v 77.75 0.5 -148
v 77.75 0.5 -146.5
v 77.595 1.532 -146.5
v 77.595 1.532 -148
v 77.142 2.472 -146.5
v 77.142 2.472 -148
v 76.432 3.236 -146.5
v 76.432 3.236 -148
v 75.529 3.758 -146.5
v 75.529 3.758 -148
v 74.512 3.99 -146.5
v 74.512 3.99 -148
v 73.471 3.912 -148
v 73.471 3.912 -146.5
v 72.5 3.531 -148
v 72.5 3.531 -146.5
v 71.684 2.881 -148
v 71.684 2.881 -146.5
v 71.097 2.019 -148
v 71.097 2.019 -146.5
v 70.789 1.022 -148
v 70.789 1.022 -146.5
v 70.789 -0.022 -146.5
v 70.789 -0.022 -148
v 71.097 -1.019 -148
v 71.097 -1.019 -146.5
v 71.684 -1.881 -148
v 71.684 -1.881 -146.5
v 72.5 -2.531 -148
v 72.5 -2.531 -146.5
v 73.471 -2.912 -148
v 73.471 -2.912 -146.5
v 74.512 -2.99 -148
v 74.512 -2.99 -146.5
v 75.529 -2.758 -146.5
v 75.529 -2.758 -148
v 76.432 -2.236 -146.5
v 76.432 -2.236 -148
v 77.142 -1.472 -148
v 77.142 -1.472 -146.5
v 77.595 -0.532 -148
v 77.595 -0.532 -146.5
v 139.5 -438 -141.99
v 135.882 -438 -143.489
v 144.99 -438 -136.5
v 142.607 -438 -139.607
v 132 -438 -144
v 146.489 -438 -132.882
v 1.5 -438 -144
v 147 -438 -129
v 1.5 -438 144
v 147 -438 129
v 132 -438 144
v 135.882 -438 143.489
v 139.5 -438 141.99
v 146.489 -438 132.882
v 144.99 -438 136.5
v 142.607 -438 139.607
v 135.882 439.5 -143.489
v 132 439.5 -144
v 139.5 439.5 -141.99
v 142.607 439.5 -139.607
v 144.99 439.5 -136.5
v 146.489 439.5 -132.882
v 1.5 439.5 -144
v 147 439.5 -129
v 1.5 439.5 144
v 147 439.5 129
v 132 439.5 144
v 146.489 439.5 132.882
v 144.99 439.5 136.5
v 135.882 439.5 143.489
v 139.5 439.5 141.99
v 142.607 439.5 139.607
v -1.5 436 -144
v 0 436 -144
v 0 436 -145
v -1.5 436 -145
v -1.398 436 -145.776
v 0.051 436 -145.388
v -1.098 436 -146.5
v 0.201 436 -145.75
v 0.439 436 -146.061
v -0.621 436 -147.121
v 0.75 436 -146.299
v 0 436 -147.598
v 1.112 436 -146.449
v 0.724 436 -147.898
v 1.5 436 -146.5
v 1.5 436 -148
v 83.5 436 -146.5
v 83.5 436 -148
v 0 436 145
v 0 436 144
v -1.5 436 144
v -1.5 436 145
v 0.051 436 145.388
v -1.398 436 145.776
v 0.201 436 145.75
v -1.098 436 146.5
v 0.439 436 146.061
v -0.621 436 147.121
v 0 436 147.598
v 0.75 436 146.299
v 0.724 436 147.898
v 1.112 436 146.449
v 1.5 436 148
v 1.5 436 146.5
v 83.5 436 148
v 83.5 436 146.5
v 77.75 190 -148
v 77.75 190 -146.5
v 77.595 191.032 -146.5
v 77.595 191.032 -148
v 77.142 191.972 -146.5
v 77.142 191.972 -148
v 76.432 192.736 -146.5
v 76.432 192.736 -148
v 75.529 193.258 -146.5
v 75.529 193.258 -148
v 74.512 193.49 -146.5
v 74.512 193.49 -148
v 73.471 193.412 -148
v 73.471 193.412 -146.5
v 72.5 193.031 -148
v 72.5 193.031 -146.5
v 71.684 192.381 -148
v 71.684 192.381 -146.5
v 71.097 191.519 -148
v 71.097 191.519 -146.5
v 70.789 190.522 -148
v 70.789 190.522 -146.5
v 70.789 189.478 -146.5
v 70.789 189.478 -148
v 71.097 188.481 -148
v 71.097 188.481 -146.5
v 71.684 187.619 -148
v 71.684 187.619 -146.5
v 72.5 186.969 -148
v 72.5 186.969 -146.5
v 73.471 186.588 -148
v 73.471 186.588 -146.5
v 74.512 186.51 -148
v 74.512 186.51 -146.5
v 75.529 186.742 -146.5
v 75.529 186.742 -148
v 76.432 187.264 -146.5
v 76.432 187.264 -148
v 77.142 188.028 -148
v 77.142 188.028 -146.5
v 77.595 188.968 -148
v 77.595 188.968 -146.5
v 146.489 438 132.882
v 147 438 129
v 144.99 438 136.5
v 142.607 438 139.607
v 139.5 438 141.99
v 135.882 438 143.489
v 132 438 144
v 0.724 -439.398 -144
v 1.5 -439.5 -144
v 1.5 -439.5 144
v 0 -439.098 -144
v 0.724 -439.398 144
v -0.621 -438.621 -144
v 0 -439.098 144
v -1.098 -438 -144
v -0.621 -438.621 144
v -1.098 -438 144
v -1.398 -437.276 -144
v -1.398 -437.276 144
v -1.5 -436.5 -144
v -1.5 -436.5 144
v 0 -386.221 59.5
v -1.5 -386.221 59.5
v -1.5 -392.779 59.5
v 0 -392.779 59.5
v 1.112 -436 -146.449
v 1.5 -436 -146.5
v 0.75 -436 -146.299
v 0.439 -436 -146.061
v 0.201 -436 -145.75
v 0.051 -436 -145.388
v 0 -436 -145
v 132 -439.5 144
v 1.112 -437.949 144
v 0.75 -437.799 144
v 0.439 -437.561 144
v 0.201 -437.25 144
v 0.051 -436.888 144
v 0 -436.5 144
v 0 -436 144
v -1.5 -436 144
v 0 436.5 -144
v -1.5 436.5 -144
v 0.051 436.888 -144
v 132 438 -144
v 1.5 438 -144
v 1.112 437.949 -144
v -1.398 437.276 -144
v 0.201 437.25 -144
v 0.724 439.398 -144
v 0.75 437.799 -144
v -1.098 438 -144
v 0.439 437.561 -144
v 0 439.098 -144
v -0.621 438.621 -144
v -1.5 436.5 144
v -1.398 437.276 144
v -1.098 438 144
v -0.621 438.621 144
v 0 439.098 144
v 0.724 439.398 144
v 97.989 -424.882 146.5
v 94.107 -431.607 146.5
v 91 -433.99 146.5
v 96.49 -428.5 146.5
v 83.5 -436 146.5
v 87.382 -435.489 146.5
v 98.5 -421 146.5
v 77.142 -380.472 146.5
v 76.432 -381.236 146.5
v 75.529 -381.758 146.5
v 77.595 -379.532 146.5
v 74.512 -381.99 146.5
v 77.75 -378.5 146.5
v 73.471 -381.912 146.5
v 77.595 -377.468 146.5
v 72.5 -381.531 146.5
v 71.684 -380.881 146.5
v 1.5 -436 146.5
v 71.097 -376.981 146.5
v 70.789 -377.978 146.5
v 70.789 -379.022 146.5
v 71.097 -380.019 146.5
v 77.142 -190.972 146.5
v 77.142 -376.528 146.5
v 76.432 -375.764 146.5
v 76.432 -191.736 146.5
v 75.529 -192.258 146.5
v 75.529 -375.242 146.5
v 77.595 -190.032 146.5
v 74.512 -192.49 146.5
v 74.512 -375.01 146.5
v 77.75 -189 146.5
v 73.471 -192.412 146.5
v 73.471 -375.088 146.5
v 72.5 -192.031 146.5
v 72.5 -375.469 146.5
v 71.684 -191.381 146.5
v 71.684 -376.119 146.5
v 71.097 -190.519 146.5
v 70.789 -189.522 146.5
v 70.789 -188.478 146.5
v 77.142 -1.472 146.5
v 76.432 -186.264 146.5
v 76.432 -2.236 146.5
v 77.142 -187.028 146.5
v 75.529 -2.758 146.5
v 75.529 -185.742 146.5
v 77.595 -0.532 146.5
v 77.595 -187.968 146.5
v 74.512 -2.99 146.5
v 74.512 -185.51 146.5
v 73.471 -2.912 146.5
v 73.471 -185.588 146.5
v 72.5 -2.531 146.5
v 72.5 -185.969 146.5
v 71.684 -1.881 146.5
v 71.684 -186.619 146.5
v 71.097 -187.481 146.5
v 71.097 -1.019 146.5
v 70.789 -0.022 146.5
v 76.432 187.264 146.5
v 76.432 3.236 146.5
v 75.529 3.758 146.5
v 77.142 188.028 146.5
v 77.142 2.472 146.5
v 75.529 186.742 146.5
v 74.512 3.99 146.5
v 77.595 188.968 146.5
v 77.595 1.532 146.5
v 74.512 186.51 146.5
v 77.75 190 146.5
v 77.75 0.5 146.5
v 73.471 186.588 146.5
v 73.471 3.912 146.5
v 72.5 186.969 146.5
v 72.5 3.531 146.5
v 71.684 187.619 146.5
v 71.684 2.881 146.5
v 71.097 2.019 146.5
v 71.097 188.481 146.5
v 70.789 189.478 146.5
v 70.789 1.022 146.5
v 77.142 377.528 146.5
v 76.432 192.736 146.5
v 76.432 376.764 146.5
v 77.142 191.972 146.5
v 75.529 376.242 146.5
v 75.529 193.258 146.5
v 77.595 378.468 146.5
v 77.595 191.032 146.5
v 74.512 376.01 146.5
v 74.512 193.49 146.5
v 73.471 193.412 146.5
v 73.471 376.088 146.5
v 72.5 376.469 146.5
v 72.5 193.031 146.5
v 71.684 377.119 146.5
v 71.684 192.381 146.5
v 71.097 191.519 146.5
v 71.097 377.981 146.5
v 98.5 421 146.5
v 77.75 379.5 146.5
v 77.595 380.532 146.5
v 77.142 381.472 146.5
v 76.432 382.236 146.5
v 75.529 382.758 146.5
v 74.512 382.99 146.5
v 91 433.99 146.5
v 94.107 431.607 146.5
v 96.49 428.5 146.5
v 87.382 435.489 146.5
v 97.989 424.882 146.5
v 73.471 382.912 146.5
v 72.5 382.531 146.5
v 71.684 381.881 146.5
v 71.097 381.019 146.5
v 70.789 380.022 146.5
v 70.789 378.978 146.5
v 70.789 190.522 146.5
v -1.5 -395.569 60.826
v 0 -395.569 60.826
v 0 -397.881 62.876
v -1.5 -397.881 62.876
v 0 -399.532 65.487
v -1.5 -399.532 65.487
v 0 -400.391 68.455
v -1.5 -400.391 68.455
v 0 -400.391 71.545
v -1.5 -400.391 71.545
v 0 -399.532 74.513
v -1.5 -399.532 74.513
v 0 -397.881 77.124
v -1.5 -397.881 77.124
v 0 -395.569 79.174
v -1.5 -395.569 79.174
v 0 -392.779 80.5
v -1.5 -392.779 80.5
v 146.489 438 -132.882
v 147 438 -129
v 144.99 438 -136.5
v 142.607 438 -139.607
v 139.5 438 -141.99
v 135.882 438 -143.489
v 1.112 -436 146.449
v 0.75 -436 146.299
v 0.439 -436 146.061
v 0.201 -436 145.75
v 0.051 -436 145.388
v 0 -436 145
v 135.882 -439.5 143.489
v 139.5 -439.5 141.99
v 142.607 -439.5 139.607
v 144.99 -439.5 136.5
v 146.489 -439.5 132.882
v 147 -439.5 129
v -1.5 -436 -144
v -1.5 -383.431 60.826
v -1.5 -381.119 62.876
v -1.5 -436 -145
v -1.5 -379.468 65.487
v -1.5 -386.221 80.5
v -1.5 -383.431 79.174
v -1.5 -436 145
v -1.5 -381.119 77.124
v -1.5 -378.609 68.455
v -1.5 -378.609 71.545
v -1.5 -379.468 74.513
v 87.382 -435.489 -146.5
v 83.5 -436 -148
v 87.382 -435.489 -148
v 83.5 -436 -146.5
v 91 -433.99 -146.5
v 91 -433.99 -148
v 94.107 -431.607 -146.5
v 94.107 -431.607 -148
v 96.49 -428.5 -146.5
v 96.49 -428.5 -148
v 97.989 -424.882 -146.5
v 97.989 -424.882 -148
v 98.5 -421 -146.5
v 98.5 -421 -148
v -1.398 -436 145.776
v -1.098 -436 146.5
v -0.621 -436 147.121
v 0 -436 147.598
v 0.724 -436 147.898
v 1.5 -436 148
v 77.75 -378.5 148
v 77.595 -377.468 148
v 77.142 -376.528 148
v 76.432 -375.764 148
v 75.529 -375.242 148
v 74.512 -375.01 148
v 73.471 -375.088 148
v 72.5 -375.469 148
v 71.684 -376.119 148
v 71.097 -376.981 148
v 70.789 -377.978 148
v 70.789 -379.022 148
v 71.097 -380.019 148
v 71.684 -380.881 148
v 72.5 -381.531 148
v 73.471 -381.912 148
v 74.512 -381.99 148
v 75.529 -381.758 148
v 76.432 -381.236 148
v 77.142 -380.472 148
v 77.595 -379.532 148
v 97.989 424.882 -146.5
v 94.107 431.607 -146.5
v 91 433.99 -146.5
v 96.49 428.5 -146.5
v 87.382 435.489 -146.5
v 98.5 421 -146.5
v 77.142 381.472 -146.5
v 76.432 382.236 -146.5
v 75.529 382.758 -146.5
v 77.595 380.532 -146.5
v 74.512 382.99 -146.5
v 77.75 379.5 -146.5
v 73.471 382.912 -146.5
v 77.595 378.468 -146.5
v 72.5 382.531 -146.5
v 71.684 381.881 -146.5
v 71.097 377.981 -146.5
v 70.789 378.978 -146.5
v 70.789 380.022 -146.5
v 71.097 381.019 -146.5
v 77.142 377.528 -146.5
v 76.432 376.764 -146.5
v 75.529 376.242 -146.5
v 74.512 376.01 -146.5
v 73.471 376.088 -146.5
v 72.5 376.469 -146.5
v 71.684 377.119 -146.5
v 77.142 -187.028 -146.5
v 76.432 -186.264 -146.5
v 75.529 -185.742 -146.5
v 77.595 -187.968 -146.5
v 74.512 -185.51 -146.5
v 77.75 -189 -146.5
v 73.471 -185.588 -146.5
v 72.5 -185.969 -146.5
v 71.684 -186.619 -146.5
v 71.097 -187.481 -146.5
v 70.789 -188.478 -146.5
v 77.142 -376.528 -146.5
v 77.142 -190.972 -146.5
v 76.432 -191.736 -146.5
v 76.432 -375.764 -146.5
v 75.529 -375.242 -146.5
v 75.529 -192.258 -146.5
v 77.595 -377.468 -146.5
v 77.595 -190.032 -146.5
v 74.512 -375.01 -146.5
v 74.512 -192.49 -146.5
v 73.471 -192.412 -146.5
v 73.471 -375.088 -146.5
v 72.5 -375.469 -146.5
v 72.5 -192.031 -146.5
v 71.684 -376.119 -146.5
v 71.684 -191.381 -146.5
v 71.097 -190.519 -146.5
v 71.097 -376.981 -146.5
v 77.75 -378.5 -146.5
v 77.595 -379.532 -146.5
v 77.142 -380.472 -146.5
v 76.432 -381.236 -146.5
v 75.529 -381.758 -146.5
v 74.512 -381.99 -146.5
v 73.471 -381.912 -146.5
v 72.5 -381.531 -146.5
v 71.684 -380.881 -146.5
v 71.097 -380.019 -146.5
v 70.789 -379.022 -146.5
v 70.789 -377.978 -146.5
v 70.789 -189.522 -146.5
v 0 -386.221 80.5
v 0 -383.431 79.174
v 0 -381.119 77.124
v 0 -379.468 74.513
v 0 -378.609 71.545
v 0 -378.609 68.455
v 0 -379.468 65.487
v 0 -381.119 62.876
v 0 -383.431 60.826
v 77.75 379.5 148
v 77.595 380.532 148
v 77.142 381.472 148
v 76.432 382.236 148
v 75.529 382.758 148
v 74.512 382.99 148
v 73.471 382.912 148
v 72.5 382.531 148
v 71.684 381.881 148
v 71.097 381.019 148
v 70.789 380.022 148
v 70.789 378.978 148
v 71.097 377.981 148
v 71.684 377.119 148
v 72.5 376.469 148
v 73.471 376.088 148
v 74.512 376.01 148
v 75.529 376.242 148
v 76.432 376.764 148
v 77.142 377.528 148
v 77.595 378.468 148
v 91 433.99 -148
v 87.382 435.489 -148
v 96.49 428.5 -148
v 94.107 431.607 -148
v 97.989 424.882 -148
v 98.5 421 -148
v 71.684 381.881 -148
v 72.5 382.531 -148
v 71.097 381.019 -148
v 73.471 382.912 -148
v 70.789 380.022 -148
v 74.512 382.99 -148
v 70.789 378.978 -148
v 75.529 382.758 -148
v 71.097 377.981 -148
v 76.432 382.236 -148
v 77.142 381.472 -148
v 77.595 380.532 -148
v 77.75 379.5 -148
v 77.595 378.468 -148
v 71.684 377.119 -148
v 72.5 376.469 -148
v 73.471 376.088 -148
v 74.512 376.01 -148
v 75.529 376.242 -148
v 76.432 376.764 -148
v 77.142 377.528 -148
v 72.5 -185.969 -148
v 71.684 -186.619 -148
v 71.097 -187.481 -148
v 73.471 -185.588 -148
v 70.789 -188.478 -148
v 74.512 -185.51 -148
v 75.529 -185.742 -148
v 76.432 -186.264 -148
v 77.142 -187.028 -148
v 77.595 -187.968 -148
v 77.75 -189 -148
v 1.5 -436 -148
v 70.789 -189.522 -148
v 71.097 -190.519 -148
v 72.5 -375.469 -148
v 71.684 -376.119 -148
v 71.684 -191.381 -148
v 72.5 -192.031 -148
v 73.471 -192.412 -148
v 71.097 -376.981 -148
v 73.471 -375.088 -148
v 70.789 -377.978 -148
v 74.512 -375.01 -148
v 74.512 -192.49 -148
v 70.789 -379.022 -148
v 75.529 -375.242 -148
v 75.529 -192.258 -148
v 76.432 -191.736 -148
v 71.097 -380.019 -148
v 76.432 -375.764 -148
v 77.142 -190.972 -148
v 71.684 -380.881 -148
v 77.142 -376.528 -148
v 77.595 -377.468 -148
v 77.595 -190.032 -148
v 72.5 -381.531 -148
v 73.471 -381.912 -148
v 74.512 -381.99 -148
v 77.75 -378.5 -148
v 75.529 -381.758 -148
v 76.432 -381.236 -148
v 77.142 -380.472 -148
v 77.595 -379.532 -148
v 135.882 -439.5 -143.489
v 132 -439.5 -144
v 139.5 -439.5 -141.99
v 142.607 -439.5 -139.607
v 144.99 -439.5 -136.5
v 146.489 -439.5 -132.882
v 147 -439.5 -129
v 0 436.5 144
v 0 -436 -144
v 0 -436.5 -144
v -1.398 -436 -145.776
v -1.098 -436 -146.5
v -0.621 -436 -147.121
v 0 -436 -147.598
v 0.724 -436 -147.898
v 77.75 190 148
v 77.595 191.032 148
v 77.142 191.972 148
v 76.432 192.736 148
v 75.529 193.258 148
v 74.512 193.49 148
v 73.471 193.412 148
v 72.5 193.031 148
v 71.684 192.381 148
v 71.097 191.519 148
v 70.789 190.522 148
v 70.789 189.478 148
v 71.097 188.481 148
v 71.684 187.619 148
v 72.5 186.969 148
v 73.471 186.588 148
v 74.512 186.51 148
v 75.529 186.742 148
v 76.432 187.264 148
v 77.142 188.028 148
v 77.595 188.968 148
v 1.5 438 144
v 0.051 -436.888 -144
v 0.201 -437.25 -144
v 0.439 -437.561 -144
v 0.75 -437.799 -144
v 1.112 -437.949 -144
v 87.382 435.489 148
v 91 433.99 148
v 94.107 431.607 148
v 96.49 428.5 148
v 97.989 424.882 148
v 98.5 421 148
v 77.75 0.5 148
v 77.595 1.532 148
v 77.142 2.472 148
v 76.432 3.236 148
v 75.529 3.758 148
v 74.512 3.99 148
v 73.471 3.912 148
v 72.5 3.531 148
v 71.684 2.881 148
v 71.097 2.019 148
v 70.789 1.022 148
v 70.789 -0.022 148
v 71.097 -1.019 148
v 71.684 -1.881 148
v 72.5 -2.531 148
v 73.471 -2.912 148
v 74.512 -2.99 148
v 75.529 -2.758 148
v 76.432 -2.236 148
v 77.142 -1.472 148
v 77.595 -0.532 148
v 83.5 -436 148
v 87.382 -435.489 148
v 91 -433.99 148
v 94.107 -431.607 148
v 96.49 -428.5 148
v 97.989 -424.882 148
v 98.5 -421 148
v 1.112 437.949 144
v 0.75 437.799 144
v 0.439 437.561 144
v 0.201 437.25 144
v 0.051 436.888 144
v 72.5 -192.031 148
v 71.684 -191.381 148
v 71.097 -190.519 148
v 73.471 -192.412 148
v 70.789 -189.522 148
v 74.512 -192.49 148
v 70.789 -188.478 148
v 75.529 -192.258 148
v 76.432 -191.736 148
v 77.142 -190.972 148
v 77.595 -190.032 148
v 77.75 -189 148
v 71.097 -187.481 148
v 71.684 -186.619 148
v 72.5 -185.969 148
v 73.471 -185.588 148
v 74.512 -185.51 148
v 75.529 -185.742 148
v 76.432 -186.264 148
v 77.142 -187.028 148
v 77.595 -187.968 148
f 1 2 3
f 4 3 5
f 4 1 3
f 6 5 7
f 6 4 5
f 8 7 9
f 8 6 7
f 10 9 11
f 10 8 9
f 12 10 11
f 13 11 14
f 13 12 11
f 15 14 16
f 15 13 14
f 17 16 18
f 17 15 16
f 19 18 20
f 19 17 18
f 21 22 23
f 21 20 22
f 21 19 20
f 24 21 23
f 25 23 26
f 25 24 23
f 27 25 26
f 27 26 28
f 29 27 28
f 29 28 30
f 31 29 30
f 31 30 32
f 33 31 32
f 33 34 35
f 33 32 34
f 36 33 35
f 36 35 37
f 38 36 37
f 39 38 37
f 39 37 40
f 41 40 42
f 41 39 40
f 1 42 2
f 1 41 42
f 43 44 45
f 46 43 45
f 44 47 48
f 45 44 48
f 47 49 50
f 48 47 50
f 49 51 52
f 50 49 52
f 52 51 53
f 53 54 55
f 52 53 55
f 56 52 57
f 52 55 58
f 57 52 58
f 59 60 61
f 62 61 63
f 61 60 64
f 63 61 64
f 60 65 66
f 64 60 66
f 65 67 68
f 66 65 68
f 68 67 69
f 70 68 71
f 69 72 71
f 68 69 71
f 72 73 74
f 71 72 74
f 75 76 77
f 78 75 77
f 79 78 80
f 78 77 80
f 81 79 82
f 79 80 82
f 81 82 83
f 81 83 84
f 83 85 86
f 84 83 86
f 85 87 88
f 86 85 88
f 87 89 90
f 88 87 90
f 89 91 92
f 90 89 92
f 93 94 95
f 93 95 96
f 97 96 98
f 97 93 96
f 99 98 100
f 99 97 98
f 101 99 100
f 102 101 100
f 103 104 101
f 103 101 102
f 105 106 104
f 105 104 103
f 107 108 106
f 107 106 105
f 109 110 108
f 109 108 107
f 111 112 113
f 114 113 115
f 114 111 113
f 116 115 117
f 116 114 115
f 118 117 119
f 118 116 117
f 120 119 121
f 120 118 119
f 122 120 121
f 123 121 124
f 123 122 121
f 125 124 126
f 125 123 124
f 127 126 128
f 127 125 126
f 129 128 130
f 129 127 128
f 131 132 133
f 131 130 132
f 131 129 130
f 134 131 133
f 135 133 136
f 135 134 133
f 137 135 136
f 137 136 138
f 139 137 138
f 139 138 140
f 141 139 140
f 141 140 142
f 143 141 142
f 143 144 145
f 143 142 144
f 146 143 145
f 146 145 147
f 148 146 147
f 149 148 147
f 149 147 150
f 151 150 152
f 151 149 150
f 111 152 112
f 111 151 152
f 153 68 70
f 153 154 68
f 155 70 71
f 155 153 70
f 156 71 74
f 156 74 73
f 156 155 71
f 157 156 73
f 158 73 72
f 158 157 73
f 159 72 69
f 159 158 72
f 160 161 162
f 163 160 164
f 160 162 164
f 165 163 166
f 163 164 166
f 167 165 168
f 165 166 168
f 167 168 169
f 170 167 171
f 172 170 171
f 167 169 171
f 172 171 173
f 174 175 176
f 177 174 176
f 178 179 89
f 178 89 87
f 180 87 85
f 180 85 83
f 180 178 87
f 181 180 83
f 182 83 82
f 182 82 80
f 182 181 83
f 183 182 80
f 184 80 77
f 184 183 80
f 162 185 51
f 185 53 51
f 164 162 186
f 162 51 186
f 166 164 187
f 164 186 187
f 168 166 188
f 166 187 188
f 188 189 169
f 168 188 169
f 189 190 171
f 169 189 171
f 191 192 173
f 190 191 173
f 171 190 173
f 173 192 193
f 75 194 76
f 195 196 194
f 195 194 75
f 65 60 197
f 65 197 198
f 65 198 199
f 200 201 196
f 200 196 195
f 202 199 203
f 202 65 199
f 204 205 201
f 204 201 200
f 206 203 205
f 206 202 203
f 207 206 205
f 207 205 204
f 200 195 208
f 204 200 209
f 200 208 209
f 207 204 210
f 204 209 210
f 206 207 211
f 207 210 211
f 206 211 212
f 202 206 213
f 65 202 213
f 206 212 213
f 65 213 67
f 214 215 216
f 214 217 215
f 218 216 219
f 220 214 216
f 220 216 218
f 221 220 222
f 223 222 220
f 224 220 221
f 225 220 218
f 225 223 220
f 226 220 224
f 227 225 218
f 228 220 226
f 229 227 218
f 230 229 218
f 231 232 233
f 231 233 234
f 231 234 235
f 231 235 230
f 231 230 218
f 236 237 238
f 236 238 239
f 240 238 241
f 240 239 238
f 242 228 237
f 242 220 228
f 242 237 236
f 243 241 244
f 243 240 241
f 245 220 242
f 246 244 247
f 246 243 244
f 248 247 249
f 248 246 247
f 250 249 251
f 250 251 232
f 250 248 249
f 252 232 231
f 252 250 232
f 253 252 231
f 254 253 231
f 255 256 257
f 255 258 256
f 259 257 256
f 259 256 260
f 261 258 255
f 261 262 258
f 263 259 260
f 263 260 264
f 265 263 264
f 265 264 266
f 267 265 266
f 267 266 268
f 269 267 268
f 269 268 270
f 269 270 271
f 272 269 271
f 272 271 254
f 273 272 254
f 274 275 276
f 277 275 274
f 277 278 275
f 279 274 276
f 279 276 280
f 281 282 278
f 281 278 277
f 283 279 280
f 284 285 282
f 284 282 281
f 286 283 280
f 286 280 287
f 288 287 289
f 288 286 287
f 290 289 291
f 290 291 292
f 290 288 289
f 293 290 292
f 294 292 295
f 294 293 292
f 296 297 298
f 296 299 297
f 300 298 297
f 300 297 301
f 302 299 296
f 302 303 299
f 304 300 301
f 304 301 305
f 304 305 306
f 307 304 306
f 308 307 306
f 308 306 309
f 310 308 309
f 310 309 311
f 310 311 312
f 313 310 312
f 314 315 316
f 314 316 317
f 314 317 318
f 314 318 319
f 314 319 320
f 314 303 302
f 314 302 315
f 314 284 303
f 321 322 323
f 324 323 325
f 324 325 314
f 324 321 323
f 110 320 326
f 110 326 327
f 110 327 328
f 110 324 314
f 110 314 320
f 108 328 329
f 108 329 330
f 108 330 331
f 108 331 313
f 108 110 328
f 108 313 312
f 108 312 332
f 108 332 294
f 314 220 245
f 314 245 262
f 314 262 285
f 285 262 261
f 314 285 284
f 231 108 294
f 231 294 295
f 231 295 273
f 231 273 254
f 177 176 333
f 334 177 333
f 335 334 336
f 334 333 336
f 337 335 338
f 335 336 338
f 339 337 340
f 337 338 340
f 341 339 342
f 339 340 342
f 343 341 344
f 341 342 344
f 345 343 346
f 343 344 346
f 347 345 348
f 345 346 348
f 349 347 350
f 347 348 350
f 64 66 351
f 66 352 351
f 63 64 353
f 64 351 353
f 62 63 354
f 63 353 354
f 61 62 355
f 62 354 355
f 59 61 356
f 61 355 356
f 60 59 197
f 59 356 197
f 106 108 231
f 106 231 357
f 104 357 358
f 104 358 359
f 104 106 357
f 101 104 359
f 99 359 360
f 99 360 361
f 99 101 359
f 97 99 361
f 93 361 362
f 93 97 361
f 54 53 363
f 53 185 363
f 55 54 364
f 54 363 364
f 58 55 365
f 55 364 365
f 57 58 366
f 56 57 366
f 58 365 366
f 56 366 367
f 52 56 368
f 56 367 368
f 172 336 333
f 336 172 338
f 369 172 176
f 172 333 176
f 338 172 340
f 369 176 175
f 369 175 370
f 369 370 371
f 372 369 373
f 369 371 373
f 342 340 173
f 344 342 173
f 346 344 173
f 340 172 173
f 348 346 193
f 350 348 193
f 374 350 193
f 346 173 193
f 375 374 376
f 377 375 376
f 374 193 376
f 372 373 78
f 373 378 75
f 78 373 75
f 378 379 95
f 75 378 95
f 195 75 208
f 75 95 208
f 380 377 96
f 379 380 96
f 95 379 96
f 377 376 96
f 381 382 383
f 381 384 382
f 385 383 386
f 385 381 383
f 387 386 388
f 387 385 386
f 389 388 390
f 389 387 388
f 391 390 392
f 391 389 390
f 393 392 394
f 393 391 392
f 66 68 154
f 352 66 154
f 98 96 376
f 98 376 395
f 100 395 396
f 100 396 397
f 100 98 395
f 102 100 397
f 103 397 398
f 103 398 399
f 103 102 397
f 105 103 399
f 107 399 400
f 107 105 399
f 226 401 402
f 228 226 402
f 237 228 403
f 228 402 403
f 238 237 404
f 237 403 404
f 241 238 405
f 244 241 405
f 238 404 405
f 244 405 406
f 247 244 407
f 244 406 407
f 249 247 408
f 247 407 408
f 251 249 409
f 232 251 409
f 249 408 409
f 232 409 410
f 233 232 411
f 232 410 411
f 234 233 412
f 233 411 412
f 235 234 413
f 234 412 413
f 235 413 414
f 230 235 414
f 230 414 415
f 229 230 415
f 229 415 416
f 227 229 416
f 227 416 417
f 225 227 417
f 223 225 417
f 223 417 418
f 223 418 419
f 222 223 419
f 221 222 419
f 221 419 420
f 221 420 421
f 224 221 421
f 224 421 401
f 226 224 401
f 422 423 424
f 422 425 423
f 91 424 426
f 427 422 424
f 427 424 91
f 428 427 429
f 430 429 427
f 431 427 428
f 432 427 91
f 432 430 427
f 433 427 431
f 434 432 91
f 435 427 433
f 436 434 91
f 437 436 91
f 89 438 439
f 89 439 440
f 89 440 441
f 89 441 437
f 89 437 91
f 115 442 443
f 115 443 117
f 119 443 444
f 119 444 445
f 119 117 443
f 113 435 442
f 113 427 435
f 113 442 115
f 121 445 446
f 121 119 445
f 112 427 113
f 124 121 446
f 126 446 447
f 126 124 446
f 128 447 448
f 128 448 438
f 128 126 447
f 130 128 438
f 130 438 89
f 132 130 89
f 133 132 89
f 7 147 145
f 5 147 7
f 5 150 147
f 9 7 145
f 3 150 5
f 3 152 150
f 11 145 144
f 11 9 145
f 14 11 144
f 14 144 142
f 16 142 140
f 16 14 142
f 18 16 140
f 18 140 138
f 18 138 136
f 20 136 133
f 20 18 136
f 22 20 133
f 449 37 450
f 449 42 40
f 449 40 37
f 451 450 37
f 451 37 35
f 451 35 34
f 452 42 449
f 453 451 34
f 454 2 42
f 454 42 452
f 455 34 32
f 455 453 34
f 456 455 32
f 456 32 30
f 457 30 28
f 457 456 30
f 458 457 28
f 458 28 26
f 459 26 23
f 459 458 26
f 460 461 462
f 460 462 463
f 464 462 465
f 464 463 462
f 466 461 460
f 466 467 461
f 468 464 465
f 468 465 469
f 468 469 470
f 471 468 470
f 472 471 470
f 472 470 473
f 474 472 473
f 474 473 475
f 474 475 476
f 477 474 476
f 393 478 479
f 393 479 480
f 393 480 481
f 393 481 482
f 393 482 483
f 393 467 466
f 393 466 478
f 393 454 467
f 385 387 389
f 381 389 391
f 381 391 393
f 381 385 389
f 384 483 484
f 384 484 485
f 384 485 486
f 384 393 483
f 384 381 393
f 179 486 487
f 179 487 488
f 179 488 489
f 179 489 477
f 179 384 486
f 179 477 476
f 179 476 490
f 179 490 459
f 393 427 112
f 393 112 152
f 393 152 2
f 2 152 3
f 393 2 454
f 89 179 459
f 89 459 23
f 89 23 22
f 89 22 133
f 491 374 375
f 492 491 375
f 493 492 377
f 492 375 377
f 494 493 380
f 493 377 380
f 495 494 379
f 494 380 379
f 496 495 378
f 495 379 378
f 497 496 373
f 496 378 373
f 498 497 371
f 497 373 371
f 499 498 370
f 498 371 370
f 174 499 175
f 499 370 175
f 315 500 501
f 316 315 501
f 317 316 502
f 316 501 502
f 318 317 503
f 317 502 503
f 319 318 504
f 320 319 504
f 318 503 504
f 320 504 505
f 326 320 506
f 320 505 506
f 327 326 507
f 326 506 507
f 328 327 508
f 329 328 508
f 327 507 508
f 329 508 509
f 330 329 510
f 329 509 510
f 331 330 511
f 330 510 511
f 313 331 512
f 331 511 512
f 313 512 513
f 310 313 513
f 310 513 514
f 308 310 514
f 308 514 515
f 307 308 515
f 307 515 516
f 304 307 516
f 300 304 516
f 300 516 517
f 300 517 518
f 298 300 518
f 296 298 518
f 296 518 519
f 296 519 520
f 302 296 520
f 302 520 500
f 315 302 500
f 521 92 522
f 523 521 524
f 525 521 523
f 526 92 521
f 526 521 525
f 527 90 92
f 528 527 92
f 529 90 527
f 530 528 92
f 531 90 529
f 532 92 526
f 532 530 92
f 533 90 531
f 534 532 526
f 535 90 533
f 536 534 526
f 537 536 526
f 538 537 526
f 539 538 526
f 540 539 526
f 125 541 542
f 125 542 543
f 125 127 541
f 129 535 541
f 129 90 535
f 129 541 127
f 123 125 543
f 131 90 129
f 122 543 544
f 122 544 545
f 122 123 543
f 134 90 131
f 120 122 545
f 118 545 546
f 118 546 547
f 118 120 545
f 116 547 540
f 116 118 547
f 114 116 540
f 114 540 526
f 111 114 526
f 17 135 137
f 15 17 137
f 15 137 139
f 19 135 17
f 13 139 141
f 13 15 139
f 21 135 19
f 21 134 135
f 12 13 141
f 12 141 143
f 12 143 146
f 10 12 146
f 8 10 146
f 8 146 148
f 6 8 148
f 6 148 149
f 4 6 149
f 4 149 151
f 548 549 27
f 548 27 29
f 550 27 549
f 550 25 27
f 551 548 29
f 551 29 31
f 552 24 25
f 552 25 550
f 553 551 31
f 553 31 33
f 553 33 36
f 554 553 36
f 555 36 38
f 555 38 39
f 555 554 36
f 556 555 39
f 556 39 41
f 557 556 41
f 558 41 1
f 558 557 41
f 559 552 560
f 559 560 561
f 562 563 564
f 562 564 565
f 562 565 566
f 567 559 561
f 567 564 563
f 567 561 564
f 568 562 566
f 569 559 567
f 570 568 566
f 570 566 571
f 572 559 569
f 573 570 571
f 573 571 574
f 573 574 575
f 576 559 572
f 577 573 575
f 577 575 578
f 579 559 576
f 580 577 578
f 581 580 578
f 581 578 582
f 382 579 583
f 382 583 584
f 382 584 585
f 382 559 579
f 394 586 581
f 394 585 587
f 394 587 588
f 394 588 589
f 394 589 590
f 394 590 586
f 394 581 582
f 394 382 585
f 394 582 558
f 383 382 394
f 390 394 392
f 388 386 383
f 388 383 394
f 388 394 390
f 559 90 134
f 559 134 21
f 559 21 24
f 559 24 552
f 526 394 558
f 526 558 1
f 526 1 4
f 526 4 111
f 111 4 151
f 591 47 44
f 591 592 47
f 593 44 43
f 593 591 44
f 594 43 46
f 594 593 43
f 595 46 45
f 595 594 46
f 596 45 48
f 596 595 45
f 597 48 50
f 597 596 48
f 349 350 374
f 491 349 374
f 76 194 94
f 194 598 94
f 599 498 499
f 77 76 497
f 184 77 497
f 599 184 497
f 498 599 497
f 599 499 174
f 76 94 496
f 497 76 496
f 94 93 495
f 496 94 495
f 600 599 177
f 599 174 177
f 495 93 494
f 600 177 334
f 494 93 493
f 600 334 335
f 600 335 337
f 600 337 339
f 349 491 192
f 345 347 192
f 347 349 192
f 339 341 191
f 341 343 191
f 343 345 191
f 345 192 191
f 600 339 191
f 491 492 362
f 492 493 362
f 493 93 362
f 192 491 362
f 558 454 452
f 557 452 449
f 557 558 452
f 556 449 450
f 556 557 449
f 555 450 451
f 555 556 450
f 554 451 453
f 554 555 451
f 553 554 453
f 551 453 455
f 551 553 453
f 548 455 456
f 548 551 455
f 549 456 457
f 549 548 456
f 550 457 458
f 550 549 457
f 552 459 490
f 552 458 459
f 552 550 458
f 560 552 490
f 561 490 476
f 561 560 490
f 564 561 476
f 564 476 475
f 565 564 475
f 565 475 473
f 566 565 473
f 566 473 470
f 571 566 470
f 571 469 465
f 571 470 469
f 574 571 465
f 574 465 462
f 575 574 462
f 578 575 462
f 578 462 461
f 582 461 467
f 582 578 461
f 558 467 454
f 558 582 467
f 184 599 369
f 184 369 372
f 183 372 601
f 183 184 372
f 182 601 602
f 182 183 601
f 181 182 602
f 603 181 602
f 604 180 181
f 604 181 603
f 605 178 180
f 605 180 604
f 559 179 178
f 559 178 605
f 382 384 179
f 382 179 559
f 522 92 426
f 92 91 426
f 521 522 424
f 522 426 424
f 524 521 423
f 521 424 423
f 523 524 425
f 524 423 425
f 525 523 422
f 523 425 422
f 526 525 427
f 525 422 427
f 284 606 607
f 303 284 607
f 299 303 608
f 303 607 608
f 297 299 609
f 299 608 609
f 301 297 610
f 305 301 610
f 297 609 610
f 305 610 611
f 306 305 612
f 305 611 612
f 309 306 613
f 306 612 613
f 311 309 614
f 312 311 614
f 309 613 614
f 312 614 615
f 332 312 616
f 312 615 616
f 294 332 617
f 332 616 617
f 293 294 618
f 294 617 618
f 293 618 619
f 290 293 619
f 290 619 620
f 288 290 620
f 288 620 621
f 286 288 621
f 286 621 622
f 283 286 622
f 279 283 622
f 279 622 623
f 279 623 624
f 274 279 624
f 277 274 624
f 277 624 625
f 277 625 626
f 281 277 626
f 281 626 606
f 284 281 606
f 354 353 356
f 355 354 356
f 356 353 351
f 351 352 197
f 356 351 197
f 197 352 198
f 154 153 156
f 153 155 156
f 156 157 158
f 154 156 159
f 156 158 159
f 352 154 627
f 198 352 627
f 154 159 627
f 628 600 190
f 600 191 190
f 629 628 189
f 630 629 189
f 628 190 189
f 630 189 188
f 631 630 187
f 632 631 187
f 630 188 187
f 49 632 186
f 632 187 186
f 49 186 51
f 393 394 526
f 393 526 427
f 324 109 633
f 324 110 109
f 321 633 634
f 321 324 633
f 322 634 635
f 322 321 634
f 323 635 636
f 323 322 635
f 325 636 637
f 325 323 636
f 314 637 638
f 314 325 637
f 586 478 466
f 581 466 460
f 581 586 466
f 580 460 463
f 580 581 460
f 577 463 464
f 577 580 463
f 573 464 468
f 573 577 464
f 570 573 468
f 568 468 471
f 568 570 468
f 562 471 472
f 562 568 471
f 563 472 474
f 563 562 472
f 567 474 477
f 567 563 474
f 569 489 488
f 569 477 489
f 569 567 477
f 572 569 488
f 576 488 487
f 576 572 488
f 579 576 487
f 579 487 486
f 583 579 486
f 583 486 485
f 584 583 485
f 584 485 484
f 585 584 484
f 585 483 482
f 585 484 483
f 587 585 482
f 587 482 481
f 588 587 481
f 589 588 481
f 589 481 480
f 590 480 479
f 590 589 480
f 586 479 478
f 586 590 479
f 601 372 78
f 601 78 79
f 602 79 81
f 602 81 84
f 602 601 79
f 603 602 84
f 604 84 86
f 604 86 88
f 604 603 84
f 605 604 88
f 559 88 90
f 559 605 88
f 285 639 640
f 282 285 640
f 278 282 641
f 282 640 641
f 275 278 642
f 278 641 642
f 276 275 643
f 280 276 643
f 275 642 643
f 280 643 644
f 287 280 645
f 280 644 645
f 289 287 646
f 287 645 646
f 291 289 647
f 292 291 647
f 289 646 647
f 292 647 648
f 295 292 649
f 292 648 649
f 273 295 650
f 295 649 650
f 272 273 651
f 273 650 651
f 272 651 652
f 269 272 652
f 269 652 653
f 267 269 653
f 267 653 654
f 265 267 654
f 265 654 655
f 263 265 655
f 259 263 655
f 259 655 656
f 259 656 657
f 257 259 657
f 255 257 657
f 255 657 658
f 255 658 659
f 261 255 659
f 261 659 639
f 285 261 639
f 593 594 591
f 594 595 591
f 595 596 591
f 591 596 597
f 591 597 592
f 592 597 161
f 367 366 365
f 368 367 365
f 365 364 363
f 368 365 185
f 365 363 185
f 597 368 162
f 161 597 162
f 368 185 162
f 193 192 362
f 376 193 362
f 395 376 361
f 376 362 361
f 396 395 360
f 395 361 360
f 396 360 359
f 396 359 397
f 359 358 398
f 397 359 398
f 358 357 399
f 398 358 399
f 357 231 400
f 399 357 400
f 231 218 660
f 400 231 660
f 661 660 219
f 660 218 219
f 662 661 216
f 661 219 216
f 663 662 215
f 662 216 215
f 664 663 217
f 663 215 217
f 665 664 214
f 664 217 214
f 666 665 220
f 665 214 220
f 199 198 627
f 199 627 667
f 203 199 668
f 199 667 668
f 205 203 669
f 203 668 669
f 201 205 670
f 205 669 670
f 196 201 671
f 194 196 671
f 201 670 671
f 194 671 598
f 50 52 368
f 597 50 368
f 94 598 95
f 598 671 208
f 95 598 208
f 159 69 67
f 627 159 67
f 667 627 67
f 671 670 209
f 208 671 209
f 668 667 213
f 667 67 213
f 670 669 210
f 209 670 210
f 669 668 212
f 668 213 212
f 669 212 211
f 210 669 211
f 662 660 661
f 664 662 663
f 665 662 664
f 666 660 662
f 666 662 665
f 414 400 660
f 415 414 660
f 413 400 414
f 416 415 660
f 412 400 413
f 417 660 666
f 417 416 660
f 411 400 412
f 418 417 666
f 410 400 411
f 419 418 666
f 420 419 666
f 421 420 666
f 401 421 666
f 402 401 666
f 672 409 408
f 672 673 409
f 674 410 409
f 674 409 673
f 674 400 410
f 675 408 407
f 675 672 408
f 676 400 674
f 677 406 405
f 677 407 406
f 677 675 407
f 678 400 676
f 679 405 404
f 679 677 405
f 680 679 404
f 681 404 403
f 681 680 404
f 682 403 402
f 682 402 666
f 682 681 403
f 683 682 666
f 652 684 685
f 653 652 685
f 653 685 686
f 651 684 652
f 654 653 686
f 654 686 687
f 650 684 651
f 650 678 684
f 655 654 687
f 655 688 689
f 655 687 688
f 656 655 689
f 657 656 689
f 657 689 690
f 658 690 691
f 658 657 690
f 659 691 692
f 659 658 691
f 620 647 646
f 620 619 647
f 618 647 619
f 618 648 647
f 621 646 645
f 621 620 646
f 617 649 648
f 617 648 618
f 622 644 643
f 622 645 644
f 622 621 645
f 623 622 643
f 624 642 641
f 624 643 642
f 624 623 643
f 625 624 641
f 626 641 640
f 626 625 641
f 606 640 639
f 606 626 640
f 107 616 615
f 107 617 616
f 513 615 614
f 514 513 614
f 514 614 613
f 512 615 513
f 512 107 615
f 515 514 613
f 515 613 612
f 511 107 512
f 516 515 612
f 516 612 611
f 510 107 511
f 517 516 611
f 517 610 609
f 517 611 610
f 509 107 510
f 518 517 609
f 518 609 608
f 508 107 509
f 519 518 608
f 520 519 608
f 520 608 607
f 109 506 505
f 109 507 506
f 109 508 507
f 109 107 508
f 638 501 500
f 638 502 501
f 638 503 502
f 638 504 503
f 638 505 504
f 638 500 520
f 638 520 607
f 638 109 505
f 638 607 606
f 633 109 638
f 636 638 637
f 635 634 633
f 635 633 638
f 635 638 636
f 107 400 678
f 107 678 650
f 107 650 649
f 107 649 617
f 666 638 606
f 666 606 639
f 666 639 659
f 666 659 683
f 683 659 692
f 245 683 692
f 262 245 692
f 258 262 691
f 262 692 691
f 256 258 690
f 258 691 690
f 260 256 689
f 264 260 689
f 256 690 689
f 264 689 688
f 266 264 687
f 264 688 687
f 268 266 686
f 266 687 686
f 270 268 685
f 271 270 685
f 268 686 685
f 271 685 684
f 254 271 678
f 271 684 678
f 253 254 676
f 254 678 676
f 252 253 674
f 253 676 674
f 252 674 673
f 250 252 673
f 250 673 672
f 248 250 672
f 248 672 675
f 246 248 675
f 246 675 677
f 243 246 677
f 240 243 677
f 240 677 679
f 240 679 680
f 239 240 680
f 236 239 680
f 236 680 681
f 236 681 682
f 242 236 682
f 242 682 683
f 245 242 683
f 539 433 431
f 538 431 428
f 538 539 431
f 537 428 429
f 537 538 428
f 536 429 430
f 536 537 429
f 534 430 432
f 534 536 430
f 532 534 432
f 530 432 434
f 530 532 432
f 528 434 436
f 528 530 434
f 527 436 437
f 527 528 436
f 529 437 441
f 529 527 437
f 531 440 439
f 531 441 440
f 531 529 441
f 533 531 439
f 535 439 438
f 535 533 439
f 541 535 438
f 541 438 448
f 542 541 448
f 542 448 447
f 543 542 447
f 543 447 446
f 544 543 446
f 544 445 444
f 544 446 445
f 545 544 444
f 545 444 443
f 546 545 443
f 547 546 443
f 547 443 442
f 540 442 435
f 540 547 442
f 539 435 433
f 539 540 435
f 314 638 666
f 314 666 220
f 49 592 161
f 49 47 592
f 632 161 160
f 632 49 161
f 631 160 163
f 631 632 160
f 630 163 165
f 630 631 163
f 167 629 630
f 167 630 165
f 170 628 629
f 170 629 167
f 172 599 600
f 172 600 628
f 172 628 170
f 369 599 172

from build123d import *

# Parameters (mm, degrees)
BASE_FLANGE1_DEPTH           = 144
EDGE_FLANGE1_DEPTH           = 872
EDGE_FLANGE1_BEND_DEPTH      = 872
F_7_0_7_DIAMETER_HOLE1_D     = 7
F_7_0_7_DIAMETER_HOLE1_DEPTH = 1.5
FILLET1_R                    = 15
CUT_EXTRUDE1_DEPTH           = 487.946095579


# Sheet-metal steps are written as plain solids
with BuildPart() as part:
    # Sketch1 → Base-Flange1 (new, symmetric)
    with BuildSketch(Plane.XY):
        with BuildLine():
            Line((147, 438), (1.5, 438))
            ThreePointArc((1.5, 438), (0.439339828, 437.560660172), (0, 436.5))
            Line((0, 436.5), (0, -436.5))
            ThreePointArc((0, -436.5), (0.439339828, -437.560660172), (1.5, -438))
            Line((1.5, -438), (147, -438))
            Line((147, -438), (147, -439.5))
            Line((147, -439.5), (1.5, -439.5))
            ThreePointArc((1.5, -439.5), (-0.621320344, -438.621320344), (-1.5, -436.5))
            Line((-1.5, -436.5), (-1.5, 436.5))
            ThreePointArc((-1.5, 436.5), (-0.621320344, 438.621320344), (1.5, 439.5))
            Line((1.5, 439.5), (147, 439.5))
            Line((147, 439.5), (147, 438))
        make_face()
    extrude(amount=BASE_FLANGE1_DEPTH, both=True)

    # Edge-Flange1 section (across the edge) → Edge-Flange1 (add)
    with BuildSketch(Plane(origin=(0, 436, 146.5), x_dir=(0, 0, -1), z_dir=(0, -1, 0))):
        with BuildLine():
            Line((-1.5, 1.5), (-1.5, 98.5))
            Line((-1.5, 98.5), (0, 98.5))
            Line((0, 98.5), (0, 1.5))
            ThreePointArc((0, 1.5), (0.439339828, 0.439339828), (1.5, 0))
            Line((1.5, 0), (2.5, 0))
            Line((2.5, 0), (2.5, -1.5))
            Line((2.5, -1.5), (1.5, -1.5))
            ThreePointArc((1.5, -1.5), (-0.621320344, -0.621320344), (-1.5, 1.5))
        make_face()
    extrude(amount=EDGE_FLANGE1_DEPTH)

    # Edge-Flange1 section 2 (across the edge) → Edge-Flange1 bend (add)
    with BuildSketch(Plane(origin=(0, -436, -146.5), x_dir=(0, 0, 1), z_dir=(0, 1, 0))):
        with BuildLine():
            Line((-1.5, 1.5), (-1.5, 98.5))
            Line((-1.5, 98.5), (0, 98.5))
            Line((0, 98.5), (0, 1.5))
            ThreePointArc((0, 1.5), (0.439339828, 0.439339828), (1.5, 0))
            Line((1.5, 0), (2.5, 0))
            Line((2.5, 0), (2.5, -1.5))
            Line((2.5, -1.5), (1.5, -1.5))
            ThreePointArc((1.5, -1.5), (-0.621320344, -0.621320344), (-1.5, 1.5))
        make_face()
    extrude(amount=EDGE_FLANGE1_BEND_DEPTH)

    # Ø7.0 (7) Diameter Hole1
    with Locations(Plane(origin=(0, 0, 146.5), x_dir=(-1, 0, 0), z_dir=(0, 0, -1))):
        with Locations((-74.25, 379.5), (-74.25, 190), (-74.25, 0.5), (-74.25, -189), (-74.25, -378.5)):
            f_7_0_7_diameter_hole1 = Hole(F_7_0_7_DIAMETER_HOLE1_D / 2, depth=F_7_0_7_DIAMETER_HOLE1_DEPTH)

    # Mirror1: Ø7.0 (7) Diameter Hole1 across plane
    add(f_7_0_7_diameter_hole1.mirror(Plane.XY), mode=Mode.SUBTRACT)

    # Fillet1
    fillet1_edges = [part.edges().sort_by_distance(p)[0] for p in [
        (147, 438.75, -144),
        (147, -438.75, -144),
        (147, 438.75, 144),
        (98.5, 436, 147.25),
        (98.5, -436, 147.25),
        (98.5, -436, -147.25),
        (98.5, 436, -147.25),
        (147, -438.75, 144),
    ]]
    fillet(fillet1_edges, radius=FILLET1_R)

    # Sketch14 → Cut-Extrude1 (cut, through all)
    with BuildSketch(Plane.ZY.offset(1.5)):
        with BuildLine():
            Line((80.5, -392.778719262), (80.5, -386.221280738))
            ThreePointArc((80.5, -386.221280738), (70, -378.5), (59.5, -386.221280738))
            Line((59.5, -386.221280738), (59.5, -392.778719262))
            ThreePointArc((59.5, -392.778719262), (70, -400.5), (80.5, -392.778719262))
        make_face()
    extrude(amount=-CUT_EXTRUDE1_DEPTH, mode=Mode.SUBTRACT)


solid = part.part
